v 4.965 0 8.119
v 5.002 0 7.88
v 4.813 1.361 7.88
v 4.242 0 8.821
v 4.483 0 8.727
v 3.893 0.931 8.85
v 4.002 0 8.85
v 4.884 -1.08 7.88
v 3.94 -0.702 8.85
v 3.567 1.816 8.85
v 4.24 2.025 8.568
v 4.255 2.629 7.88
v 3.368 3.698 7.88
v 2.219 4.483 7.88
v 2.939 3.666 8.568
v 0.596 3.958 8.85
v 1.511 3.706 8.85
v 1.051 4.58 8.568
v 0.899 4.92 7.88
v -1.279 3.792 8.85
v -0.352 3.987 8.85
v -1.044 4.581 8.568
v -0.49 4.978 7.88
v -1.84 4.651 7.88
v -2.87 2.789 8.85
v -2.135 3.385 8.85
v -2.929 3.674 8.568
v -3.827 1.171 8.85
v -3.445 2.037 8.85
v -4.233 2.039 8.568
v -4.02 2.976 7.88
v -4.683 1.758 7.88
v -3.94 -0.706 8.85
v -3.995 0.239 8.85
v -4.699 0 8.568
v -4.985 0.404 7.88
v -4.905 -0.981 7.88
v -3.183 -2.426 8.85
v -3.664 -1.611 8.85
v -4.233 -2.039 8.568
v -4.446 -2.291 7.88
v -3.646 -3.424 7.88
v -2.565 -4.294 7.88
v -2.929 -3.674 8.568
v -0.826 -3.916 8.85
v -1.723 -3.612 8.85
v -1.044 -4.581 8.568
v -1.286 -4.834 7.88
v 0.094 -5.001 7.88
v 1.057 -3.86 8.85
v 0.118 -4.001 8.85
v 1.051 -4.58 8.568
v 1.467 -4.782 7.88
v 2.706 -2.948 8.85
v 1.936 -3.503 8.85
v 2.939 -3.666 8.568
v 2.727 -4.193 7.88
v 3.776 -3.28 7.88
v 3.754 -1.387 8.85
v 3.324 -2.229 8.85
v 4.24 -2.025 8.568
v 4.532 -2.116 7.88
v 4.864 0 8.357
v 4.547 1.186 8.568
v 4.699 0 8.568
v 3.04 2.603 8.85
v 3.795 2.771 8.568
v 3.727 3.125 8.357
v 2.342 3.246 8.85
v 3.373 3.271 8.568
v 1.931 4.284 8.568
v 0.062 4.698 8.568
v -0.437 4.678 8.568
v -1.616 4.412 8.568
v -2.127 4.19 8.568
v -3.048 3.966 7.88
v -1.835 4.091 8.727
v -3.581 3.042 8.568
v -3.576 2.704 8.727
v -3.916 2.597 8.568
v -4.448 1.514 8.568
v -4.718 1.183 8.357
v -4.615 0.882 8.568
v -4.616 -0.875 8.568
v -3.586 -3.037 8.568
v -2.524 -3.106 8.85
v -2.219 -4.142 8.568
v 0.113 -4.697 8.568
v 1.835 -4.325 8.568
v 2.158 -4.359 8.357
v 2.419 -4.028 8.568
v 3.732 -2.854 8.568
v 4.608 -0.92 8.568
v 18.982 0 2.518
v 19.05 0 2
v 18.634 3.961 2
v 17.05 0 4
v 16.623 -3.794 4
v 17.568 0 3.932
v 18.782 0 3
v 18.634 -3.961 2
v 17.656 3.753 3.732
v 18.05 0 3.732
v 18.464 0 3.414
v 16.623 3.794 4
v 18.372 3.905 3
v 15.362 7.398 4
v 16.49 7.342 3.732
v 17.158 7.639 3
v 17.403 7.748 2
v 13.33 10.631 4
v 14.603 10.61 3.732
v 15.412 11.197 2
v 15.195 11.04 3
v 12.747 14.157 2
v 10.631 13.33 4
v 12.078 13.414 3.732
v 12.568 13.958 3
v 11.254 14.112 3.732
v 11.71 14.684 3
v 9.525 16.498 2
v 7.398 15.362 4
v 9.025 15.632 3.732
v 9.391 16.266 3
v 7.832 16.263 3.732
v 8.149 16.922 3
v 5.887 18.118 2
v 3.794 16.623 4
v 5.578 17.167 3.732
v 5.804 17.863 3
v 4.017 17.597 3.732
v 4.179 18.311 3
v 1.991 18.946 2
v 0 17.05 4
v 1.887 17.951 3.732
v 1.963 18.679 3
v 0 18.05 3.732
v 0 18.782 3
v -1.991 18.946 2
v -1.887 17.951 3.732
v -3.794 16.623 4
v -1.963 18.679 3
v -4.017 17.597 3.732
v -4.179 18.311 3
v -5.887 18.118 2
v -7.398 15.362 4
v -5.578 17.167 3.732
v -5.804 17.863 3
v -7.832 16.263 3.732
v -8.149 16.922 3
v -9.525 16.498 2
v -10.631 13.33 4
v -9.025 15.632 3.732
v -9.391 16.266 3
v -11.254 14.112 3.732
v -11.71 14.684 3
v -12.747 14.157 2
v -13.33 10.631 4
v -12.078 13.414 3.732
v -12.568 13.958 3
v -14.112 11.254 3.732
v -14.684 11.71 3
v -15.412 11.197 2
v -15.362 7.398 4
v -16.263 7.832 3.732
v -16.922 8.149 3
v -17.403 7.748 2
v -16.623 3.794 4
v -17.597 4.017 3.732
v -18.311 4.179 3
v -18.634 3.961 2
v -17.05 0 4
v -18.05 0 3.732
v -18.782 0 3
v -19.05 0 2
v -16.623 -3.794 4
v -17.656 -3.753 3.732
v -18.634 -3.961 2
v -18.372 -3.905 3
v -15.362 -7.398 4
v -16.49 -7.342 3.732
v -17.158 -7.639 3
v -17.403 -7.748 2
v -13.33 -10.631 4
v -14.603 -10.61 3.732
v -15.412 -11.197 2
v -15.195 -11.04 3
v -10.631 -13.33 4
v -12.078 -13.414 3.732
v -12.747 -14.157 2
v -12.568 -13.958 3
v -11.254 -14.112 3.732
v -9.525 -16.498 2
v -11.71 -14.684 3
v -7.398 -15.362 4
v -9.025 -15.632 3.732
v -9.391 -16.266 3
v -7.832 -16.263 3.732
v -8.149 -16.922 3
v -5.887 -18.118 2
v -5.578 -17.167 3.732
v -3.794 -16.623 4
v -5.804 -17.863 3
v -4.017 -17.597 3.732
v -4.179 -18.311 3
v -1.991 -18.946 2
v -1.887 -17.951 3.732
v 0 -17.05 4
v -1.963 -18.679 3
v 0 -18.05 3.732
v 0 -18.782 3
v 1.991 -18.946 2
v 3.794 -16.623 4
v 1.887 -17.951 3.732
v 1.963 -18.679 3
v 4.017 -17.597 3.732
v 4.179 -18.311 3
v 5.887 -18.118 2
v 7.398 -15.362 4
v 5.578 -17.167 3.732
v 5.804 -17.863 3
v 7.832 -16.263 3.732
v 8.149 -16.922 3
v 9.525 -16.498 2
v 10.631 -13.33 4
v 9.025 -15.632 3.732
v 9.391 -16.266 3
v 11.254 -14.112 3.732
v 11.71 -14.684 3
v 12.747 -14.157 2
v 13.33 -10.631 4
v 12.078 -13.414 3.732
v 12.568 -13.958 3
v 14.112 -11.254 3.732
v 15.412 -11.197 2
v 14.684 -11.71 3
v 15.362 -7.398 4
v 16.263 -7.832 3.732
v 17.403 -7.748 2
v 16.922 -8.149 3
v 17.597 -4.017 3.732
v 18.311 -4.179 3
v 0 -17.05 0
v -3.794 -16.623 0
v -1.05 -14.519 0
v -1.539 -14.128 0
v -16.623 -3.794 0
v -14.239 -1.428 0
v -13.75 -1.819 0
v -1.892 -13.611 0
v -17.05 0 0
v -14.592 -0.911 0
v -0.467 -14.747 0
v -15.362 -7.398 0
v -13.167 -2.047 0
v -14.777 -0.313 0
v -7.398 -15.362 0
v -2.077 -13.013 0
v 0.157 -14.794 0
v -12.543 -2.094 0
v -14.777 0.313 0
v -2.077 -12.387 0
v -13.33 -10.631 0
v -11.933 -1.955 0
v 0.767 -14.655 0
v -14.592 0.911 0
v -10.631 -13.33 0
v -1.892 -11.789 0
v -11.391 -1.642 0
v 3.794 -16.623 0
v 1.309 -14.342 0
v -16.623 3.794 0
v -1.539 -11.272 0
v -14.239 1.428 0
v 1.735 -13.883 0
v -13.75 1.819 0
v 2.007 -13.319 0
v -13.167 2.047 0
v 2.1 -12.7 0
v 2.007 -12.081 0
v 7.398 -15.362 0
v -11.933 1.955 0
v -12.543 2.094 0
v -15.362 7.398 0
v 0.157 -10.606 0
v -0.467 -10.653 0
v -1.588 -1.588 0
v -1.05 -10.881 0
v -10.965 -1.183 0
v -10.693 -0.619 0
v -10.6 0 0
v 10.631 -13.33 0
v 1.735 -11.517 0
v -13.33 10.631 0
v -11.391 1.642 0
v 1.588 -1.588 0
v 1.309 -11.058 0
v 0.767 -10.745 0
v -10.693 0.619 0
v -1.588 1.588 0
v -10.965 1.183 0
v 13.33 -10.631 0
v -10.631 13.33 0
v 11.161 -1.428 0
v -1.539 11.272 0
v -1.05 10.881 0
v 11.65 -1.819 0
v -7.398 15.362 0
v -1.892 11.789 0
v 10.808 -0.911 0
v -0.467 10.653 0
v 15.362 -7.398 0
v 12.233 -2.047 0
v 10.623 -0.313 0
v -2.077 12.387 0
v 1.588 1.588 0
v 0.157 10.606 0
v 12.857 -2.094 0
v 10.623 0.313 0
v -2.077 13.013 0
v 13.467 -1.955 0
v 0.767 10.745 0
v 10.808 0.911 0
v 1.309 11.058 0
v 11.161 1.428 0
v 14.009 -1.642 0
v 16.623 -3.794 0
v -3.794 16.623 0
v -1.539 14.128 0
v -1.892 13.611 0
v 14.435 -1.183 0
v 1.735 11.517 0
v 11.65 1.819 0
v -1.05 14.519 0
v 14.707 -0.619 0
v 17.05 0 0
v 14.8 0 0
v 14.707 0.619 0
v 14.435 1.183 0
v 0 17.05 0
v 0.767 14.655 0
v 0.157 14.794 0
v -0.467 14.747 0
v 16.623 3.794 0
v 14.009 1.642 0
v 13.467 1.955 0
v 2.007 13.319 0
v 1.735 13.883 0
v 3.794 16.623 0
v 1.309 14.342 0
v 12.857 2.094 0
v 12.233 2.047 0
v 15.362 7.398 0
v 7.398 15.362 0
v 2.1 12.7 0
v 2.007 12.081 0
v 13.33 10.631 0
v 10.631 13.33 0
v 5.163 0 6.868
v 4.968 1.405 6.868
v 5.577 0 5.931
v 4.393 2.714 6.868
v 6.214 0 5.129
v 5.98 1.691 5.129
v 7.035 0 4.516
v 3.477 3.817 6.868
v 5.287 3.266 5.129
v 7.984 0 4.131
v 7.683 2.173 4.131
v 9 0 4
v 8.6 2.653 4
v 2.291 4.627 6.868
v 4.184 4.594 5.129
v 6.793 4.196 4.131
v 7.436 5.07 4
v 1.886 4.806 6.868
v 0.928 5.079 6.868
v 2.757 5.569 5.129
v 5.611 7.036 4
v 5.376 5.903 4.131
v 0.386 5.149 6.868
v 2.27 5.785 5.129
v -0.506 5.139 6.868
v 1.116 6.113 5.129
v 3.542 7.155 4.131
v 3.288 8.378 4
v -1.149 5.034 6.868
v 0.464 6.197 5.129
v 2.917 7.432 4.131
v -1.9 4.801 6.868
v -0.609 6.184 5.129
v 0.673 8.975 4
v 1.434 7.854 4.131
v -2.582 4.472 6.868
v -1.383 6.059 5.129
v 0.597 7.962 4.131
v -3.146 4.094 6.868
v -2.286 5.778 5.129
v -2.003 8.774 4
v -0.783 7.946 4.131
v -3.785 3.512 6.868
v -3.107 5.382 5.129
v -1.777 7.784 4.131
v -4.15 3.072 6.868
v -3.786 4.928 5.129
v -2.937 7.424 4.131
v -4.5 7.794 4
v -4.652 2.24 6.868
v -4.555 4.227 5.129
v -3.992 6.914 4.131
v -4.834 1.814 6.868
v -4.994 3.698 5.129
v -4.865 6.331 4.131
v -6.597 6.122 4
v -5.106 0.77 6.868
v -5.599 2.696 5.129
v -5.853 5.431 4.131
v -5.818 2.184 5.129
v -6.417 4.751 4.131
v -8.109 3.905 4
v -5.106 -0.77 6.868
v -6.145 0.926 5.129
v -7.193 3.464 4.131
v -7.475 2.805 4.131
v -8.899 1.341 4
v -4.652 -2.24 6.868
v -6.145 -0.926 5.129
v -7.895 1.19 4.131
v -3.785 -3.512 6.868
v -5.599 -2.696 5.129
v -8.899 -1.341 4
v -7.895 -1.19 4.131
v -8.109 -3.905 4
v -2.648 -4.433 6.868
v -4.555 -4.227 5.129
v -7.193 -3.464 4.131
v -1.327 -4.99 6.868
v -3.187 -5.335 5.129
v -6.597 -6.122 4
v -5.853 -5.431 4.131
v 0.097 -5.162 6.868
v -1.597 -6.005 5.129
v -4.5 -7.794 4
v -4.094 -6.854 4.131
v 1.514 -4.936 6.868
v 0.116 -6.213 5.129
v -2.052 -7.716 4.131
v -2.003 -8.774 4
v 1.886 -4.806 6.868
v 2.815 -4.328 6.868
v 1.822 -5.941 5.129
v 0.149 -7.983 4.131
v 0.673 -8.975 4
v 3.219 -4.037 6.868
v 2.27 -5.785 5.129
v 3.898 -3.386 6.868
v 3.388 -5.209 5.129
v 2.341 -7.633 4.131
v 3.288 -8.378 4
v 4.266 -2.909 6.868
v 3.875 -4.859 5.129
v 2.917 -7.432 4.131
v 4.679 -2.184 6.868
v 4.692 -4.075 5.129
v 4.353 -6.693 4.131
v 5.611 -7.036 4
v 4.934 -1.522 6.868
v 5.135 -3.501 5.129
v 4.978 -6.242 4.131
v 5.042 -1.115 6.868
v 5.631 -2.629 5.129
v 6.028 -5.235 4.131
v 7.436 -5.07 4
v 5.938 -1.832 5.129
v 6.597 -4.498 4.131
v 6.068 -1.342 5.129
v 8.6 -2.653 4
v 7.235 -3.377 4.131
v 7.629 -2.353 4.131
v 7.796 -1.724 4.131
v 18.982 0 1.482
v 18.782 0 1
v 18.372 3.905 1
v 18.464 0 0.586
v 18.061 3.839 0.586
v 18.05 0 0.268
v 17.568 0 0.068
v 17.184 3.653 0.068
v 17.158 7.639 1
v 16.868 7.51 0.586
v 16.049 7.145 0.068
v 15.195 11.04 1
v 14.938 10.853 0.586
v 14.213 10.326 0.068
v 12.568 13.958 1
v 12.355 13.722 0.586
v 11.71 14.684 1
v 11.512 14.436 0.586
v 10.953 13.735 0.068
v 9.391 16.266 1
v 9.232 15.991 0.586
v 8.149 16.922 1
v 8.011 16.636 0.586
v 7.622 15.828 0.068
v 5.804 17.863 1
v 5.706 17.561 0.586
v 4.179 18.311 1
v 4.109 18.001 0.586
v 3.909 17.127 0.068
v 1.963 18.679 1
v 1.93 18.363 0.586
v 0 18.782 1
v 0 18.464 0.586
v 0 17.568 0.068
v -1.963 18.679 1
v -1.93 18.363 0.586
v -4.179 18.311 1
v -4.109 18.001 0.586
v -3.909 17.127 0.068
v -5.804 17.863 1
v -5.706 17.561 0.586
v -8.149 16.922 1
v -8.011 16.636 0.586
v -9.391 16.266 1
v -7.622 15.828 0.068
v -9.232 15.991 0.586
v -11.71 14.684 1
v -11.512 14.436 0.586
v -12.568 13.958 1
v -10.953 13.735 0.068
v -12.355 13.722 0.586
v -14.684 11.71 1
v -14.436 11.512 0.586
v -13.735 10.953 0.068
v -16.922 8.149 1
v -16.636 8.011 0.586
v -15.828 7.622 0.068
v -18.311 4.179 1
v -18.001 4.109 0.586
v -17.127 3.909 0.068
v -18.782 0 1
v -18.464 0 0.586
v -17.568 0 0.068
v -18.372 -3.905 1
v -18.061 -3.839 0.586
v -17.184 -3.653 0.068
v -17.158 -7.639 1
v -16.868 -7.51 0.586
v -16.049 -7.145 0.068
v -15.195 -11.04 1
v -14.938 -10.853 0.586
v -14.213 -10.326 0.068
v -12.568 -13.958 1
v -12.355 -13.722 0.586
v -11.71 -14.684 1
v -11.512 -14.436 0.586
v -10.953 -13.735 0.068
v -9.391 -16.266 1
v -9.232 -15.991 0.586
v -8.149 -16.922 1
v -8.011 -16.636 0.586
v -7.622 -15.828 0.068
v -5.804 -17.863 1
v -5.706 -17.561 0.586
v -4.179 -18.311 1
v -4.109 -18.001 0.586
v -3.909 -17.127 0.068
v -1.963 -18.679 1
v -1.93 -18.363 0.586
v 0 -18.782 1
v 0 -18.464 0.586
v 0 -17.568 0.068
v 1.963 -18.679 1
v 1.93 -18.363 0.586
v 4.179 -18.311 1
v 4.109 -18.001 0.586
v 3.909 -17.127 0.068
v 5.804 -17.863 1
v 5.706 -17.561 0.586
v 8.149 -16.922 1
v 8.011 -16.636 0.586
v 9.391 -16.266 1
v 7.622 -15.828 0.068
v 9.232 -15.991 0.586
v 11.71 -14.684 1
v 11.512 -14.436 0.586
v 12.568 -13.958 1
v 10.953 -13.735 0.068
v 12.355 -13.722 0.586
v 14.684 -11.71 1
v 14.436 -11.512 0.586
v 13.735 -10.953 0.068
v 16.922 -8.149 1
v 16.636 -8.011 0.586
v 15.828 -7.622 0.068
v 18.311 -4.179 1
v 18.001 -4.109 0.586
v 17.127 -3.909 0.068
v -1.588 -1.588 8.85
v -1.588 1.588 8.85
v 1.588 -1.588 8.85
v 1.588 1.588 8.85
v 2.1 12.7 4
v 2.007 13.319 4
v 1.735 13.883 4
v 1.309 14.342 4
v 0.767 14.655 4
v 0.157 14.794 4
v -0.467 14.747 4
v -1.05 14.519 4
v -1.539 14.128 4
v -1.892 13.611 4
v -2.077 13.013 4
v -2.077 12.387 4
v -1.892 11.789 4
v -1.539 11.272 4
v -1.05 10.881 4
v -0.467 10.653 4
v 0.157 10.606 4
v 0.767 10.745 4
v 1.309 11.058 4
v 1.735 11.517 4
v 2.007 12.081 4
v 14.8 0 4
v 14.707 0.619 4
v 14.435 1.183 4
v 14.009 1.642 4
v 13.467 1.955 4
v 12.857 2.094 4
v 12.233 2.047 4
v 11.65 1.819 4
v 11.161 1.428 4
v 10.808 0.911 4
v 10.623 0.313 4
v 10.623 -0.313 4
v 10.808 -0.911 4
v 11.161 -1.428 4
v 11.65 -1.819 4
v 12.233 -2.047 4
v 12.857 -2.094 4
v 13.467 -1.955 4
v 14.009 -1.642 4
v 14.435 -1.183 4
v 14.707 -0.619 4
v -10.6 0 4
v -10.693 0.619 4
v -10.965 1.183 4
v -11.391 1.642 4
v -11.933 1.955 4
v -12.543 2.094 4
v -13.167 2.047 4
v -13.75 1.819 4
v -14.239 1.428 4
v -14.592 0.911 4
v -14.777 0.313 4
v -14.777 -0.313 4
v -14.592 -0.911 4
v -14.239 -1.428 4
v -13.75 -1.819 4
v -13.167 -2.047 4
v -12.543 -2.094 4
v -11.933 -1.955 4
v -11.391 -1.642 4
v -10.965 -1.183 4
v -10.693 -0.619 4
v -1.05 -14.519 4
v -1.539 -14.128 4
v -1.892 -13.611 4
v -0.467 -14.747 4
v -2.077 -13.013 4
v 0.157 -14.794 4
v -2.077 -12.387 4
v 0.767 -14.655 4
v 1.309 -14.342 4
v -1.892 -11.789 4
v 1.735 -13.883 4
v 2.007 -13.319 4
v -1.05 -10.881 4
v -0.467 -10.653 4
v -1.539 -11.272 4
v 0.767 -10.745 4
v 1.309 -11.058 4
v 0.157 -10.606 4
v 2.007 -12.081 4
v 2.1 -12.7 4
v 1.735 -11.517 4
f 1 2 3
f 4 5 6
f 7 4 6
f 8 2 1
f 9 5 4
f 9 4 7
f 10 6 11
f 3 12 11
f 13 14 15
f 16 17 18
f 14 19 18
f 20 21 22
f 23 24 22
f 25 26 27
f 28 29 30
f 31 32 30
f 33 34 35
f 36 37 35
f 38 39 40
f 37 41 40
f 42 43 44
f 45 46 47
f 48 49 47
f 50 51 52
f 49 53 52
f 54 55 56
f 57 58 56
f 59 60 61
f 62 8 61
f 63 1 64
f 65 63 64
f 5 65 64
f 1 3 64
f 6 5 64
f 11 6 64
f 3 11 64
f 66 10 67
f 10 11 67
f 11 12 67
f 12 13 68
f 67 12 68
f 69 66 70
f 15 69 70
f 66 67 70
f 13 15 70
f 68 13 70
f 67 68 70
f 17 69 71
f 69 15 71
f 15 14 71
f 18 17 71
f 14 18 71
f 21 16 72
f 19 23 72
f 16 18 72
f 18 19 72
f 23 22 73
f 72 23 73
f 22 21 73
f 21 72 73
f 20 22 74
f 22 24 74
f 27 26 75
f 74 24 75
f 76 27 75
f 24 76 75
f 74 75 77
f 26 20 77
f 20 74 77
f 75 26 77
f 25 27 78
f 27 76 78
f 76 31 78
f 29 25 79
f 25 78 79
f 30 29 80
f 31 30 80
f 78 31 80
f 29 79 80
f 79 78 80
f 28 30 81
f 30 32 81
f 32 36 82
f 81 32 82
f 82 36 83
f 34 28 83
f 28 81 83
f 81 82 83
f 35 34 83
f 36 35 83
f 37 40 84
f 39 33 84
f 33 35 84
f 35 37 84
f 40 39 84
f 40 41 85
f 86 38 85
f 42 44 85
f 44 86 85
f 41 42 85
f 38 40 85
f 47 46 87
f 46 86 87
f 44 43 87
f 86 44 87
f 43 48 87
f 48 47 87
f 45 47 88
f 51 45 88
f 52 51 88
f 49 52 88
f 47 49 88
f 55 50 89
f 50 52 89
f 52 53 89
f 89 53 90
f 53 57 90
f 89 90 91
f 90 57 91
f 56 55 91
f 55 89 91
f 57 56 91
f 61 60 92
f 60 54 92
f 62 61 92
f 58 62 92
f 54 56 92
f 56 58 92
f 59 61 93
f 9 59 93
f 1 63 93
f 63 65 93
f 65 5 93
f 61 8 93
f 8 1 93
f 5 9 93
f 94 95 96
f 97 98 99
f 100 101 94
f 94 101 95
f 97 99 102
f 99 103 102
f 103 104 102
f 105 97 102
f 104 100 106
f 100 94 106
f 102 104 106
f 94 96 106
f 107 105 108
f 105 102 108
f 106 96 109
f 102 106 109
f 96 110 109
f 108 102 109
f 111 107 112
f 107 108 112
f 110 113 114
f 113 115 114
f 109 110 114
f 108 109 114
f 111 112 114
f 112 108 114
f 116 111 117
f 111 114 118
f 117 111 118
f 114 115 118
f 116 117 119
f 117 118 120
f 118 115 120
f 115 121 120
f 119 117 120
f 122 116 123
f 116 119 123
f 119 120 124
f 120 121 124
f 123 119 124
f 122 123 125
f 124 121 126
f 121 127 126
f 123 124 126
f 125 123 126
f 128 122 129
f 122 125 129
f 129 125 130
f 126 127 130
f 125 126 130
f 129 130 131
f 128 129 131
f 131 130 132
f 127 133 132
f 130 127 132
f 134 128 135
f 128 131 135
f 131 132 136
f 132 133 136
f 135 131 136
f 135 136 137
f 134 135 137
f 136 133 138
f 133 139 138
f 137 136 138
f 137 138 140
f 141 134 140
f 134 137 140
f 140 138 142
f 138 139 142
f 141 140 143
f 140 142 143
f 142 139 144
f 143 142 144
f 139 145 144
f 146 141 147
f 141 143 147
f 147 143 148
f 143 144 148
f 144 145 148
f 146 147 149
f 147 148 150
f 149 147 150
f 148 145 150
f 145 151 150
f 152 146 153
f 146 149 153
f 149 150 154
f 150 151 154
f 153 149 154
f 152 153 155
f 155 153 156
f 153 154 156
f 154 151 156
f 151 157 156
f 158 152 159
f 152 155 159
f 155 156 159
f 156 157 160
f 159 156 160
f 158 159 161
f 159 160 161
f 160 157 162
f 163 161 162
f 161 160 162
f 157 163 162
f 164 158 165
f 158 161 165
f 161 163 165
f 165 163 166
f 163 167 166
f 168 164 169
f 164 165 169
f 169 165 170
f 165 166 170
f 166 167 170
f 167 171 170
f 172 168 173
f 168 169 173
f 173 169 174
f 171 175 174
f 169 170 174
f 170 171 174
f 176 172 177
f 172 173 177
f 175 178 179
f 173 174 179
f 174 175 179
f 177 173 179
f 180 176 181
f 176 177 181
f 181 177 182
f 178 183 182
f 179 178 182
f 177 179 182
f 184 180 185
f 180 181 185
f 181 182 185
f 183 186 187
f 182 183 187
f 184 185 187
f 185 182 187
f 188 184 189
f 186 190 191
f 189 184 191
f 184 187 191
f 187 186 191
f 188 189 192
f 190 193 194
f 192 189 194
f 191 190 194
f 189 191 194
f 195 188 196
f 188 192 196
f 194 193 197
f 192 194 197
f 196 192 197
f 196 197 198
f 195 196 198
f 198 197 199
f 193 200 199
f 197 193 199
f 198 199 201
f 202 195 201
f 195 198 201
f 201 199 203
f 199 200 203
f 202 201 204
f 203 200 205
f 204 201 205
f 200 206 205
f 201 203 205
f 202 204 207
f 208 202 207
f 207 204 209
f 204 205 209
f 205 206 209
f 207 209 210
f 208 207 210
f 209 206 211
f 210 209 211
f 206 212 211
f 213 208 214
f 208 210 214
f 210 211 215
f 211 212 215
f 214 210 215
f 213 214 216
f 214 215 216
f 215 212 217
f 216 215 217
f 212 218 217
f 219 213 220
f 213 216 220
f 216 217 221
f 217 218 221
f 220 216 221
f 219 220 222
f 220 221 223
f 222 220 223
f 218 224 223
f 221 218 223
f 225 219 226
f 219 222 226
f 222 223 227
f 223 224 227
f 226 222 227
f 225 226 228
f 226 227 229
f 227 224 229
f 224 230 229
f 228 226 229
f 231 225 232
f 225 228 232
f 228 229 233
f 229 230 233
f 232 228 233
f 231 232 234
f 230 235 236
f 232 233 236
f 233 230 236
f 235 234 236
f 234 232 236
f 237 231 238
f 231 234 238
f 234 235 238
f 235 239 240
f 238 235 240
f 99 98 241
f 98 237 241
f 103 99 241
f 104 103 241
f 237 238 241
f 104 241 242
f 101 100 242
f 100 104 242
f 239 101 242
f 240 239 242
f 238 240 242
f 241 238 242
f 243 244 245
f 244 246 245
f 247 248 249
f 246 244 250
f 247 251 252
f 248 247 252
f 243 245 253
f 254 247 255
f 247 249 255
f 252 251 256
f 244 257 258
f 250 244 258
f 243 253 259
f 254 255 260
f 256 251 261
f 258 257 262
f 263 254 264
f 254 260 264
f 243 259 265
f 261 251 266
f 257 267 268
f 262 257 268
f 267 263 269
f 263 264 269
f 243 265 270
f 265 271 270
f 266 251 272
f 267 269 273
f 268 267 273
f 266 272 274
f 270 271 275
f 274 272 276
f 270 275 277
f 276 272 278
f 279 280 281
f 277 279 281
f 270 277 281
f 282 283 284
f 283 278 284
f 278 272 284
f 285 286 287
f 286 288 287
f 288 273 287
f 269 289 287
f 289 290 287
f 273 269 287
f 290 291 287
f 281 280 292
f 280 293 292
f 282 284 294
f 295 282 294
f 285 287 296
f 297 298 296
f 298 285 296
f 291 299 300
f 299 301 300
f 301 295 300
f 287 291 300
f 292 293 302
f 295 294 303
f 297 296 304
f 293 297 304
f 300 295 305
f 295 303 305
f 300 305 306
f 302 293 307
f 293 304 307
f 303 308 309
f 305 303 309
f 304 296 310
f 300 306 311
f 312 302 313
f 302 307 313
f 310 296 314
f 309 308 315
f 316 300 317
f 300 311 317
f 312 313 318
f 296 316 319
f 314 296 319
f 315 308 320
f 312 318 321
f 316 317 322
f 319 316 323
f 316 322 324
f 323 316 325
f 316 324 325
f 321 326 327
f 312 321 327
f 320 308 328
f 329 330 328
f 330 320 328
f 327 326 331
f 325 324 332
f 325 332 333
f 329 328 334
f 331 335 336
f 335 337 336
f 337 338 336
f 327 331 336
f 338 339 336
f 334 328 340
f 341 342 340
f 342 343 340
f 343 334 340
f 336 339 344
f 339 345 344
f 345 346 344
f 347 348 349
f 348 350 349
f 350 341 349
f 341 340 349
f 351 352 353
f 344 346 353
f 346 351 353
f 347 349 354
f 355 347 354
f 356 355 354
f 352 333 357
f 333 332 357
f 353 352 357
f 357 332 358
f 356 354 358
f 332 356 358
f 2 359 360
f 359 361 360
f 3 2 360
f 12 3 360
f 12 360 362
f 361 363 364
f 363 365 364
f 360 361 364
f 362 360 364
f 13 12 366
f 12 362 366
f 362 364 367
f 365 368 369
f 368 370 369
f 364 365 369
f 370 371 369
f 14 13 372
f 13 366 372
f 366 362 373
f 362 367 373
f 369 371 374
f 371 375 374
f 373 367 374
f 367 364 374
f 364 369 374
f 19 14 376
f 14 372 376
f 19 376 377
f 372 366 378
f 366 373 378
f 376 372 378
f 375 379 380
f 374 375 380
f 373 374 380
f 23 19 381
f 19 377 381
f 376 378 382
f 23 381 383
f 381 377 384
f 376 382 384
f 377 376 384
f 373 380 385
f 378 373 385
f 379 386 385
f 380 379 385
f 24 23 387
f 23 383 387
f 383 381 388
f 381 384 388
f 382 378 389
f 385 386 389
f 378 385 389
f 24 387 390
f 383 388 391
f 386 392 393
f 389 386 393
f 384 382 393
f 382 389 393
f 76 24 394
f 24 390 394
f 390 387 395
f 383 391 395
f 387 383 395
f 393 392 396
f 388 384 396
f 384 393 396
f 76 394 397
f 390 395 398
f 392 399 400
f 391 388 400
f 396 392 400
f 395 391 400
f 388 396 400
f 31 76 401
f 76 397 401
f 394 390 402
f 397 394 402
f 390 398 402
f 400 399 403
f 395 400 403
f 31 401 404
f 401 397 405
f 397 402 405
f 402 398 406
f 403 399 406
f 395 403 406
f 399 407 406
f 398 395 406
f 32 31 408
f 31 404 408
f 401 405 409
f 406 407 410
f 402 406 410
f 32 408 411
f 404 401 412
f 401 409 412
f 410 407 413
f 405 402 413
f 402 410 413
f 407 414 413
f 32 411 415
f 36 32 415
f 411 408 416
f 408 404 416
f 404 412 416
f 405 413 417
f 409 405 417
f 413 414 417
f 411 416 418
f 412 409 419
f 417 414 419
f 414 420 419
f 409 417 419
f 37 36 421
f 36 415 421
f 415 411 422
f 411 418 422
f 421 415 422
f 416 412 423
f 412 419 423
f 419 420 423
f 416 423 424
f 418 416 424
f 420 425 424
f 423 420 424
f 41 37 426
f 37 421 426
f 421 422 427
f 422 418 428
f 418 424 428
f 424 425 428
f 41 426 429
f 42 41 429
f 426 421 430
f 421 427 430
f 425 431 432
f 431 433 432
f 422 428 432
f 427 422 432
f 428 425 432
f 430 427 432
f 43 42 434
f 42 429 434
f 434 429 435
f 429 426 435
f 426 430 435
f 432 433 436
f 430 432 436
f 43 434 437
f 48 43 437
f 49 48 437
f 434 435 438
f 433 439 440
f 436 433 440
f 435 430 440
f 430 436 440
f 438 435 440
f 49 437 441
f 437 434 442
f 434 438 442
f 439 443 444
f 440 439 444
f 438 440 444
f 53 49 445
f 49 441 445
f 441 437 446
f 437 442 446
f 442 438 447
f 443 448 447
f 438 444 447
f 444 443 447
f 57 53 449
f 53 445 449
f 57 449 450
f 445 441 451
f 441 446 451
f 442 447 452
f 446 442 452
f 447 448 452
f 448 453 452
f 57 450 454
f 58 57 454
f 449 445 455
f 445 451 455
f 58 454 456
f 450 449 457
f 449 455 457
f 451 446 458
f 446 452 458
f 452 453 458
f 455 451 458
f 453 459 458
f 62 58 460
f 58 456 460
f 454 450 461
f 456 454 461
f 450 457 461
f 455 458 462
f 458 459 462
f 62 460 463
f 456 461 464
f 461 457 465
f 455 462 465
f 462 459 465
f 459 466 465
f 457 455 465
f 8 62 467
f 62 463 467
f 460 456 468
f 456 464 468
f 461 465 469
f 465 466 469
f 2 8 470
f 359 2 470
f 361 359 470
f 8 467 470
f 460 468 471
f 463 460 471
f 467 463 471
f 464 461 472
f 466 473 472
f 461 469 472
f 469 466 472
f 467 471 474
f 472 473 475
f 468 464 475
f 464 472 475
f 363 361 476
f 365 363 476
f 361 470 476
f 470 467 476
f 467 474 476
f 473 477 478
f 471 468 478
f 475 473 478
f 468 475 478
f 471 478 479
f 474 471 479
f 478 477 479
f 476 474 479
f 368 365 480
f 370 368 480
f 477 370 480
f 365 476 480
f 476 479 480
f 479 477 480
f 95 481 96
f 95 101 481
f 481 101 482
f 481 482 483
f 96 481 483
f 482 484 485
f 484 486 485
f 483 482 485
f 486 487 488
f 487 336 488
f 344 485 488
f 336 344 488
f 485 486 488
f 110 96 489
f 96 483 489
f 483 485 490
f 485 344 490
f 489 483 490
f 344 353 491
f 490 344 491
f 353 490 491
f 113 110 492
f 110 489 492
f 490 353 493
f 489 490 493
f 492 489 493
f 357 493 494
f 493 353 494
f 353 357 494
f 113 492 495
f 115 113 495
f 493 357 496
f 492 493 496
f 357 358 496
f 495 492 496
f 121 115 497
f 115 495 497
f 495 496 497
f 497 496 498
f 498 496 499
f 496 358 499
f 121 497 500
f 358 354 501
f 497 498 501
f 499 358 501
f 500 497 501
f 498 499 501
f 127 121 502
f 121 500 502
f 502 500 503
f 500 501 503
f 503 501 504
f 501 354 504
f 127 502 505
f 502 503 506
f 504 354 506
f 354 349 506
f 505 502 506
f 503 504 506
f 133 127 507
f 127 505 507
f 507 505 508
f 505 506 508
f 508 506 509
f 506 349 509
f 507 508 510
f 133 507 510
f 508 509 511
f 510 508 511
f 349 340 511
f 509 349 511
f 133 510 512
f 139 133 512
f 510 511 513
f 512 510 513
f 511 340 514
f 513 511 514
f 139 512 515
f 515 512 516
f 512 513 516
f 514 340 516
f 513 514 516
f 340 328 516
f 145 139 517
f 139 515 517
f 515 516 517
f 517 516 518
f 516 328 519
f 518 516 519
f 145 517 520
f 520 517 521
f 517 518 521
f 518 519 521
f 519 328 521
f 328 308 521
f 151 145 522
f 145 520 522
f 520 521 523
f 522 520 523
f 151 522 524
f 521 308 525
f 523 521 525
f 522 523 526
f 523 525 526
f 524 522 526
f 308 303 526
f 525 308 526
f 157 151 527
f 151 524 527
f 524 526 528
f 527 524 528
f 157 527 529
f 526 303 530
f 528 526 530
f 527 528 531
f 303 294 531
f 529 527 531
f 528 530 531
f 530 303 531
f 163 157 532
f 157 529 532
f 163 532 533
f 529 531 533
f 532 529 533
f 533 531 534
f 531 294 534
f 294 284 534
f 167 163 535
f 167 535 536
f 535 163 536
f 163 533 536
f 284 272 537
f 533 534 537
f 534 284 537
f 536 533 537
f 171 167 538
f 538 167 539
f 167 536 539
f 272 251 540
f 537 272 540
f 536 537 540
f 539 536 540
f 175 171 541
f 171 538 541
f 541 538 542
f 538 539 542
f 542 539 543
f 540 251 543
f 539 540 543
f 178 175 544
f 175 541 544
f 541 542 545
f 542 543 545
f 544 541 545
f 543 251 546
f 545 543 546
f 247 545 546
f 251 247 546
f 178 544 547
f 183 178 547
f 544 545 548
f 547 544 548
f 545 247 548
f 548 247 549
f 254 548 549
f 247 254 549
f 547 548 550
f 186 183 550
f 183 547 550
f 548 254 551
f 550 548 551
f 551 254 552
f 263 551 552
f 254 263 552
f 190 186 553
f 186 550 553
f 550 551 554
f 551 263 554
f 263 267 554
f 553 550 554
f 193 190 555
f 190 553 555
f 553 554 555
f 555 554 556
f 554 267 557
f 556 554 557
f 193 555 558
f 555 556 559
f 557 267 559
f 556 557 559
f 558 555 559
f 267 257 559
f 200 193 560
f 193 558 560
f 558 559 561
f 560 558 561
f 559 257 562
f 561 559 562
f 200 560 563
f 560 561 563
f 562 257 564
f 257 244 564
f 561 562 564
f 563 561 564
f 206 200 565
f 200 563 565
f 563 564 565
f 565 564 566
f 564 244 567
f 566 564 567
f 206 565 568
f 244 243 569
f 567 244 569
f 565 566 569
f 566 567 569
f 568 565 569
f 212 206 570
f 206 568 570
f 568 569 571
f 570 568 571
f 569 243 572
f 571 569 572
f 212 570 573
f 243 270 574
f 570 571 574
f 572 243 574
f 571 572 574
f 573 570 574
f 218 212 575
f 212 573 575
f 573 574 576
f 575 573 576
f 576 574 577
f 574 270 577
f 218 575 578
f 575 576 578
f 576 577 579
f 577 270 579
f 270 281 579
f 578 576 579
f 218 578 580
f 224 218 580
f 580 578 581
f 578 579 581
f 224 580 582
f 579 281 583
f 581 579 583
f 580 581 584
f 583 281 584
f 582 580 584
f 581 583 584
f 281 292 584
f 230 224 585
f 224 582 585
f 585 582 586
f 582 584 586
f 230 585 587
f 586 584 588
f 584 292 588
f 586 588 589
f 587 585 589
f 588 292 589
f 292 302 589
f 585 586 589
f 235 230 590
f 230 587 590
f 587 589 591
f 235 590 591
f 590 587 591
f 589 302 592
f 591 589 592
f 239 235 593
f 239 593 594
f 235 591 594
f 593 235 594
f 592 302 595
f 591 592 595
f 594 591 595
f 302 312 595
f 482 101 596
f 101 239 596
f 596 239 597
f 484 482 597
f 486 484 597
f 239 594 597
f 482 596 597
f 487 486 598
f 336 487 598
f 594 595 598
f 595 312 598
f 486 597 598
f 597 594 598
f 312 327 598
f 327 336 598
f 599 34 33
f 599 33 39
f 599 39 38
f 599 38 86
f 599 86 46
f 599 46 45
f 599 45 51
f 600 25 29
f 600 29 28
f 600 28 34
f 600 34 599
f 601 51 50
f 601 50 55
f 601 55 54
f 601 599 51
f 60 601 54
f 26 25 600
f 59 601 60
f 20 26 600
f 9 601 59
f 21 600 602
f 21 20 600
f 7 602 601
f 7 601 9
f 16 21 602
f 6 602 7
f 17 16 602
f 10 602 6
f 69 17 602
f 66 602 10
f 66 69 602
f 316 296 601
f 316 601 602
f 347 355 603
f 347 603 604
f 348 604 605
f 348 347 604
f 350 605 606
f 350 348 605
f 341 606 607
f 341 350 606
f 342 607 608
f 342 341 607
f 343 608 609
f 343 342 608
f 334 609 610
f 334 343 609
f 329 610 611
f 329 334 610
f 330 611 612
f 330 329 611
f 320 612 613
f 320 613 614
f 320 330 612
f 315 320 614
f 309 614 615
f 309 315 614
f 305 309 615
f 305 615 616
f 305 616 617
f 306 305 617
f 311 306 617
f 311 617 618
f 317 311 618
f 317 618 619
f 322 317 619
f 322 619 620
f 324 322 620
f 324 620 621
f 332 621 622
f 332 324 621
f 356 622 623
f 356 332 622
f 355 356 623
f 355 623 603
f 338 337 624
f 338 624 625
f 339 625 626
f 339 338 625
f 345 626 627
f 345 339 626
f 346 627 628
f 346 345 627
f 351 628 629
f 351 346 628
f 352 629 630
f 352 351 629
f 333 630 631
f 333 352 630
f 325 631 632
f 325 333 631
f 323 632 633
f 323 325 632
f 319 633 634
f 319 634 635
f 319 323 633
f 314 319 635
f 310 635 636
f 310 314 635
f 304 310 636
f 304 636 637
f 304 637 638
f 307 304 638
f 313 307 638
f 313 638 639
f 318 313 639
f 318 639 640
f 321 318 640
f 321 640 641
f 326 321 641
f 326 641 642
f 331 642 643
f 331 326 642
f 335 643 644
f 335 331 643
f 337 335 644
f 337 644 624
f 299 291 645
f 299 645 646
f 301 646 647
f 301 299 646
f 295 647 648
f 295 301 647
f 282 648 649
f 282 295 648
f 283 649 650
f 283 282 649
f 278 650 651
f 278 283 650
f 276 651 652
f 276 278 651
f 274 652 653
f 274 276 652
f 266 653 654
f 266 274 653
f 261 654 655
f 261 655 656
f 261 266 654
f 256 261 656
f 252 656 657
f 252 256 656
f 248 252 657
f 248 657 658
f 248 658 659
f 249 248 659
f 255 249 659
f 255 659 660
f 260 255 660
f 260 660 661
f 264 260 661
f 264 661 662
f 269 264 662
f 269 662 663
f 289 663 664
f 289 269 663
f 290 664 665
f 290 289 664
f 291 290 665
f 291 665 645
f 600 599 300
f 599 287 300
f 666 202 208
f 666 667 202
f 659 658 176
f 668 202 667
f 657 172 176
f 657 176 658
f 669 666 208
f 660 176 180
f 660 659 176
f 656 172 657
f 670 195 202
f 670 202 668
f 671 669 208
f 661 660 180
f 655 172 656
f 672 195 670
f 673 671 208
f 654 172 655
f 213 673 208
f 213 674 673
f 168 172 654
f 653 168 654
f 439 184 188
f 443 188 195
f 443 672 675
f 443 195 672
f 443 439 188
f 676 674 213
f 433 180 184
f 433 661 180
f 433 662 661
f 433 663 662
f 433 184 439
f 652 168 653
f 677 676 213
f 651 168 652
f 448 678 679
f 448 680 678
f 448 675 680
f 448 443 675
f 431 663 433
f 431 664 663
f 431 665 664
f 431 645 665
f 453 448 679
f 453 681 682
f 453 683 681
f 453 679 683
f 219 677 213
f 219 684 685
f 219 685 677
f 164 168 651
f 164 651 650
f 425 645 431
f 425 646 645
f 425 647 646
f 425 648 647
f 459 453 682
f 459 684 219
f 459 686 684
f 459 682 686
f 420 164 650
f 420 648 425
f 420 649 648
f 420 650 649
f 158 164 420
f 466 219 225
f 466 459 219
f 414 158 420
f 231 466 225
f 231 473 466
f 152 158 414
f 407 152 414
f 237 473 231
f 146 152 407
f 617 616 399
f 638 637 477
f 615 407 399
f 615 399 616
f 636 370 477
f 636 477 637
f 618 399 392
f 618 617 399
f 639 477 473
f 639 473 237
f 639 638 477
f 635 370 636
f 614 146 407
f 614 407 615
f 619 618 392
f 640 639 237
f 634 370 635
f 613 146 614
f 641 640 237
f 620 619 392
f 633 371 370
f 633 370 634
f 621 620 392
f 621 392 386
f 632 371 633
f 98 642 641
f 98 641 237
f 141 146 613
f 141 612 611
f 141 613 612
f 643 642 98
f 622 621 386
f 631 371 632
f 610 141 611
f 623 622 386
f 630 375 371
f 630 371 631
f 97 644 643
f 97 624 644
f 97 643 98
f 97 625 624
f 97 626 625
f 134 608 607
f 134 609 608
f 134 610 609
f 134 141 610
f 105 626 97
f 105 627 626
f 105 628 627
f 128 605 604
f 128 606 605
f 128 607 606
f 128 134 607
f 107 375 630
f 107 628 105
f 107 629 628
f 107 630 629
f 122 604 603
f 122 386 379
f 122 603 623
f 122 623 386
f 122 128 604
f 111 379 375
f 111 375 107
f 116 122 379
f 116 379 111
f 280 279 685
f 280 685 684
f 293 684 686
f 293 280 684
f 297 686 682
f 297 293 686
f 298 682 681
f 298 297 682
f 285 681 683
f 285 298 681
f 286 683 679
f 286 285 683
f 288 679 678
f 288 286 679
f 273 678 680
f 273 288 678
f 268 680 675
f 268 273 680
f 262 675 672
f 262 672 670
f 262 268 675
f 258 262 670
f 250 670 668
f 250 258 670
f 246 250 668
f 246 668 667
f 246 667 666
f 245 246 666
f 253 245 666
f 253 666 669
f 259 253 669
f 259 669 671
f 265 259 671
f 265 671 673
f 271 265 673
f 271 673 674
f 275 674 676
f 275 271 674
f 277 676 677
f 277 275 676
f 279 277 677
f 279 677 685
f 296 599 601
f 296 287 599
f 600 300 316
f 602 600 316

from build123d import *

# Parameters (mm, degrees)
SKETCH1_R           = 19.05
SKETCH1_R_2         = 5
SKETCH1_R_3         = 2.1
SKETCH1_W           = 3.175
SKETCH1_H           = 3.175
BOSS_EXTRUDE1_DEPTH = 4
BOSS_EXTRUDE2_START = 4
SKETCH1_3_R         = 5
SKETCH1_3_W         = 3.175
SKETCH1_3_H         = 3.175
BOSS_EXTRUDE2_DEPTH = 4.85
FILLET1_R           = 4
FILLET2_R           = 1
FILLET3_R           = 2


with BuildPart() as part:
    # Sketch1 → Boss-Extrude1 (new body)
    # profile 1 of 2: a face of its own
    with BuildSketch(Plane.XY):
        Circle(SKETCH1_R)
        Circle(SKETCH1_R_2, mode=Mode.SUBTRACT)
        with Locations((12.7, 0)):
            Circle(SKETCH1_R_3, mode=Mode.SUBTRACT)
        with Locations((0, -12.7)):
            Circle(SKETCH1_R_3, mode=Mode.SUBTRACT)
        with Locations((-12.7, 0)):
            Circle(SKETCH1_R_3, mode=Mode.SUBTRACT)
        with Locations((0, 12.7)):
            Circle(SKETCH1_R_3, mode=Mode.SUBTRACT)
    # profile 2 of 2: a face of its own
    with BuildSketch(Plane.XY):
        Circle(SKETCH1_R_2)
        Rectangle(SKETCH1_W, SKETCH1_H, mode=Mode.SUBTRACT)
    extrude(amount=BOSS_EXTRUDE1_DEPTH)

    # Sketch1<3> → Boss-Extrude2 (add)
    with BuildSketch(Plane.XY.offset(BOSS_EXTRUDE2_START)):
        Circle(SKETCH1_3_R)
        Rectangle(SKETCH1_3_W, SKETCH1_3_H, mode=Mode.SUBTRACT)
    extrude(amount=BOSS_EXTRUDE2_DEPTH)

    # Fillet1
    fillet1_edges = [part.edges().sort_by_distance(p)[0] for p in [
        (-5, 0, 4),
    ]]
    fillet(fillet1_edges, radius=FILLET1_R)

    # Fillet2
    fillet2_edges = [part.edges().sort_by_distance(p)[0] for p in [
        (-5, 0, 8.85),
    ]]
    fillet(fillet2_edges, radius=FILLET2_R)

    # Fillet3
    fillet3_edges = [part.edges().sort_by_distance(p)[0] for p in [
        (-19.05, 0, 0),
        (-19.05, 0, 4),
    ]]
    fillet(fillet3_edges, radius=FILLET3_R - 0.0001)  # a hair under: the kernel refuses the full size


solid = part.part
